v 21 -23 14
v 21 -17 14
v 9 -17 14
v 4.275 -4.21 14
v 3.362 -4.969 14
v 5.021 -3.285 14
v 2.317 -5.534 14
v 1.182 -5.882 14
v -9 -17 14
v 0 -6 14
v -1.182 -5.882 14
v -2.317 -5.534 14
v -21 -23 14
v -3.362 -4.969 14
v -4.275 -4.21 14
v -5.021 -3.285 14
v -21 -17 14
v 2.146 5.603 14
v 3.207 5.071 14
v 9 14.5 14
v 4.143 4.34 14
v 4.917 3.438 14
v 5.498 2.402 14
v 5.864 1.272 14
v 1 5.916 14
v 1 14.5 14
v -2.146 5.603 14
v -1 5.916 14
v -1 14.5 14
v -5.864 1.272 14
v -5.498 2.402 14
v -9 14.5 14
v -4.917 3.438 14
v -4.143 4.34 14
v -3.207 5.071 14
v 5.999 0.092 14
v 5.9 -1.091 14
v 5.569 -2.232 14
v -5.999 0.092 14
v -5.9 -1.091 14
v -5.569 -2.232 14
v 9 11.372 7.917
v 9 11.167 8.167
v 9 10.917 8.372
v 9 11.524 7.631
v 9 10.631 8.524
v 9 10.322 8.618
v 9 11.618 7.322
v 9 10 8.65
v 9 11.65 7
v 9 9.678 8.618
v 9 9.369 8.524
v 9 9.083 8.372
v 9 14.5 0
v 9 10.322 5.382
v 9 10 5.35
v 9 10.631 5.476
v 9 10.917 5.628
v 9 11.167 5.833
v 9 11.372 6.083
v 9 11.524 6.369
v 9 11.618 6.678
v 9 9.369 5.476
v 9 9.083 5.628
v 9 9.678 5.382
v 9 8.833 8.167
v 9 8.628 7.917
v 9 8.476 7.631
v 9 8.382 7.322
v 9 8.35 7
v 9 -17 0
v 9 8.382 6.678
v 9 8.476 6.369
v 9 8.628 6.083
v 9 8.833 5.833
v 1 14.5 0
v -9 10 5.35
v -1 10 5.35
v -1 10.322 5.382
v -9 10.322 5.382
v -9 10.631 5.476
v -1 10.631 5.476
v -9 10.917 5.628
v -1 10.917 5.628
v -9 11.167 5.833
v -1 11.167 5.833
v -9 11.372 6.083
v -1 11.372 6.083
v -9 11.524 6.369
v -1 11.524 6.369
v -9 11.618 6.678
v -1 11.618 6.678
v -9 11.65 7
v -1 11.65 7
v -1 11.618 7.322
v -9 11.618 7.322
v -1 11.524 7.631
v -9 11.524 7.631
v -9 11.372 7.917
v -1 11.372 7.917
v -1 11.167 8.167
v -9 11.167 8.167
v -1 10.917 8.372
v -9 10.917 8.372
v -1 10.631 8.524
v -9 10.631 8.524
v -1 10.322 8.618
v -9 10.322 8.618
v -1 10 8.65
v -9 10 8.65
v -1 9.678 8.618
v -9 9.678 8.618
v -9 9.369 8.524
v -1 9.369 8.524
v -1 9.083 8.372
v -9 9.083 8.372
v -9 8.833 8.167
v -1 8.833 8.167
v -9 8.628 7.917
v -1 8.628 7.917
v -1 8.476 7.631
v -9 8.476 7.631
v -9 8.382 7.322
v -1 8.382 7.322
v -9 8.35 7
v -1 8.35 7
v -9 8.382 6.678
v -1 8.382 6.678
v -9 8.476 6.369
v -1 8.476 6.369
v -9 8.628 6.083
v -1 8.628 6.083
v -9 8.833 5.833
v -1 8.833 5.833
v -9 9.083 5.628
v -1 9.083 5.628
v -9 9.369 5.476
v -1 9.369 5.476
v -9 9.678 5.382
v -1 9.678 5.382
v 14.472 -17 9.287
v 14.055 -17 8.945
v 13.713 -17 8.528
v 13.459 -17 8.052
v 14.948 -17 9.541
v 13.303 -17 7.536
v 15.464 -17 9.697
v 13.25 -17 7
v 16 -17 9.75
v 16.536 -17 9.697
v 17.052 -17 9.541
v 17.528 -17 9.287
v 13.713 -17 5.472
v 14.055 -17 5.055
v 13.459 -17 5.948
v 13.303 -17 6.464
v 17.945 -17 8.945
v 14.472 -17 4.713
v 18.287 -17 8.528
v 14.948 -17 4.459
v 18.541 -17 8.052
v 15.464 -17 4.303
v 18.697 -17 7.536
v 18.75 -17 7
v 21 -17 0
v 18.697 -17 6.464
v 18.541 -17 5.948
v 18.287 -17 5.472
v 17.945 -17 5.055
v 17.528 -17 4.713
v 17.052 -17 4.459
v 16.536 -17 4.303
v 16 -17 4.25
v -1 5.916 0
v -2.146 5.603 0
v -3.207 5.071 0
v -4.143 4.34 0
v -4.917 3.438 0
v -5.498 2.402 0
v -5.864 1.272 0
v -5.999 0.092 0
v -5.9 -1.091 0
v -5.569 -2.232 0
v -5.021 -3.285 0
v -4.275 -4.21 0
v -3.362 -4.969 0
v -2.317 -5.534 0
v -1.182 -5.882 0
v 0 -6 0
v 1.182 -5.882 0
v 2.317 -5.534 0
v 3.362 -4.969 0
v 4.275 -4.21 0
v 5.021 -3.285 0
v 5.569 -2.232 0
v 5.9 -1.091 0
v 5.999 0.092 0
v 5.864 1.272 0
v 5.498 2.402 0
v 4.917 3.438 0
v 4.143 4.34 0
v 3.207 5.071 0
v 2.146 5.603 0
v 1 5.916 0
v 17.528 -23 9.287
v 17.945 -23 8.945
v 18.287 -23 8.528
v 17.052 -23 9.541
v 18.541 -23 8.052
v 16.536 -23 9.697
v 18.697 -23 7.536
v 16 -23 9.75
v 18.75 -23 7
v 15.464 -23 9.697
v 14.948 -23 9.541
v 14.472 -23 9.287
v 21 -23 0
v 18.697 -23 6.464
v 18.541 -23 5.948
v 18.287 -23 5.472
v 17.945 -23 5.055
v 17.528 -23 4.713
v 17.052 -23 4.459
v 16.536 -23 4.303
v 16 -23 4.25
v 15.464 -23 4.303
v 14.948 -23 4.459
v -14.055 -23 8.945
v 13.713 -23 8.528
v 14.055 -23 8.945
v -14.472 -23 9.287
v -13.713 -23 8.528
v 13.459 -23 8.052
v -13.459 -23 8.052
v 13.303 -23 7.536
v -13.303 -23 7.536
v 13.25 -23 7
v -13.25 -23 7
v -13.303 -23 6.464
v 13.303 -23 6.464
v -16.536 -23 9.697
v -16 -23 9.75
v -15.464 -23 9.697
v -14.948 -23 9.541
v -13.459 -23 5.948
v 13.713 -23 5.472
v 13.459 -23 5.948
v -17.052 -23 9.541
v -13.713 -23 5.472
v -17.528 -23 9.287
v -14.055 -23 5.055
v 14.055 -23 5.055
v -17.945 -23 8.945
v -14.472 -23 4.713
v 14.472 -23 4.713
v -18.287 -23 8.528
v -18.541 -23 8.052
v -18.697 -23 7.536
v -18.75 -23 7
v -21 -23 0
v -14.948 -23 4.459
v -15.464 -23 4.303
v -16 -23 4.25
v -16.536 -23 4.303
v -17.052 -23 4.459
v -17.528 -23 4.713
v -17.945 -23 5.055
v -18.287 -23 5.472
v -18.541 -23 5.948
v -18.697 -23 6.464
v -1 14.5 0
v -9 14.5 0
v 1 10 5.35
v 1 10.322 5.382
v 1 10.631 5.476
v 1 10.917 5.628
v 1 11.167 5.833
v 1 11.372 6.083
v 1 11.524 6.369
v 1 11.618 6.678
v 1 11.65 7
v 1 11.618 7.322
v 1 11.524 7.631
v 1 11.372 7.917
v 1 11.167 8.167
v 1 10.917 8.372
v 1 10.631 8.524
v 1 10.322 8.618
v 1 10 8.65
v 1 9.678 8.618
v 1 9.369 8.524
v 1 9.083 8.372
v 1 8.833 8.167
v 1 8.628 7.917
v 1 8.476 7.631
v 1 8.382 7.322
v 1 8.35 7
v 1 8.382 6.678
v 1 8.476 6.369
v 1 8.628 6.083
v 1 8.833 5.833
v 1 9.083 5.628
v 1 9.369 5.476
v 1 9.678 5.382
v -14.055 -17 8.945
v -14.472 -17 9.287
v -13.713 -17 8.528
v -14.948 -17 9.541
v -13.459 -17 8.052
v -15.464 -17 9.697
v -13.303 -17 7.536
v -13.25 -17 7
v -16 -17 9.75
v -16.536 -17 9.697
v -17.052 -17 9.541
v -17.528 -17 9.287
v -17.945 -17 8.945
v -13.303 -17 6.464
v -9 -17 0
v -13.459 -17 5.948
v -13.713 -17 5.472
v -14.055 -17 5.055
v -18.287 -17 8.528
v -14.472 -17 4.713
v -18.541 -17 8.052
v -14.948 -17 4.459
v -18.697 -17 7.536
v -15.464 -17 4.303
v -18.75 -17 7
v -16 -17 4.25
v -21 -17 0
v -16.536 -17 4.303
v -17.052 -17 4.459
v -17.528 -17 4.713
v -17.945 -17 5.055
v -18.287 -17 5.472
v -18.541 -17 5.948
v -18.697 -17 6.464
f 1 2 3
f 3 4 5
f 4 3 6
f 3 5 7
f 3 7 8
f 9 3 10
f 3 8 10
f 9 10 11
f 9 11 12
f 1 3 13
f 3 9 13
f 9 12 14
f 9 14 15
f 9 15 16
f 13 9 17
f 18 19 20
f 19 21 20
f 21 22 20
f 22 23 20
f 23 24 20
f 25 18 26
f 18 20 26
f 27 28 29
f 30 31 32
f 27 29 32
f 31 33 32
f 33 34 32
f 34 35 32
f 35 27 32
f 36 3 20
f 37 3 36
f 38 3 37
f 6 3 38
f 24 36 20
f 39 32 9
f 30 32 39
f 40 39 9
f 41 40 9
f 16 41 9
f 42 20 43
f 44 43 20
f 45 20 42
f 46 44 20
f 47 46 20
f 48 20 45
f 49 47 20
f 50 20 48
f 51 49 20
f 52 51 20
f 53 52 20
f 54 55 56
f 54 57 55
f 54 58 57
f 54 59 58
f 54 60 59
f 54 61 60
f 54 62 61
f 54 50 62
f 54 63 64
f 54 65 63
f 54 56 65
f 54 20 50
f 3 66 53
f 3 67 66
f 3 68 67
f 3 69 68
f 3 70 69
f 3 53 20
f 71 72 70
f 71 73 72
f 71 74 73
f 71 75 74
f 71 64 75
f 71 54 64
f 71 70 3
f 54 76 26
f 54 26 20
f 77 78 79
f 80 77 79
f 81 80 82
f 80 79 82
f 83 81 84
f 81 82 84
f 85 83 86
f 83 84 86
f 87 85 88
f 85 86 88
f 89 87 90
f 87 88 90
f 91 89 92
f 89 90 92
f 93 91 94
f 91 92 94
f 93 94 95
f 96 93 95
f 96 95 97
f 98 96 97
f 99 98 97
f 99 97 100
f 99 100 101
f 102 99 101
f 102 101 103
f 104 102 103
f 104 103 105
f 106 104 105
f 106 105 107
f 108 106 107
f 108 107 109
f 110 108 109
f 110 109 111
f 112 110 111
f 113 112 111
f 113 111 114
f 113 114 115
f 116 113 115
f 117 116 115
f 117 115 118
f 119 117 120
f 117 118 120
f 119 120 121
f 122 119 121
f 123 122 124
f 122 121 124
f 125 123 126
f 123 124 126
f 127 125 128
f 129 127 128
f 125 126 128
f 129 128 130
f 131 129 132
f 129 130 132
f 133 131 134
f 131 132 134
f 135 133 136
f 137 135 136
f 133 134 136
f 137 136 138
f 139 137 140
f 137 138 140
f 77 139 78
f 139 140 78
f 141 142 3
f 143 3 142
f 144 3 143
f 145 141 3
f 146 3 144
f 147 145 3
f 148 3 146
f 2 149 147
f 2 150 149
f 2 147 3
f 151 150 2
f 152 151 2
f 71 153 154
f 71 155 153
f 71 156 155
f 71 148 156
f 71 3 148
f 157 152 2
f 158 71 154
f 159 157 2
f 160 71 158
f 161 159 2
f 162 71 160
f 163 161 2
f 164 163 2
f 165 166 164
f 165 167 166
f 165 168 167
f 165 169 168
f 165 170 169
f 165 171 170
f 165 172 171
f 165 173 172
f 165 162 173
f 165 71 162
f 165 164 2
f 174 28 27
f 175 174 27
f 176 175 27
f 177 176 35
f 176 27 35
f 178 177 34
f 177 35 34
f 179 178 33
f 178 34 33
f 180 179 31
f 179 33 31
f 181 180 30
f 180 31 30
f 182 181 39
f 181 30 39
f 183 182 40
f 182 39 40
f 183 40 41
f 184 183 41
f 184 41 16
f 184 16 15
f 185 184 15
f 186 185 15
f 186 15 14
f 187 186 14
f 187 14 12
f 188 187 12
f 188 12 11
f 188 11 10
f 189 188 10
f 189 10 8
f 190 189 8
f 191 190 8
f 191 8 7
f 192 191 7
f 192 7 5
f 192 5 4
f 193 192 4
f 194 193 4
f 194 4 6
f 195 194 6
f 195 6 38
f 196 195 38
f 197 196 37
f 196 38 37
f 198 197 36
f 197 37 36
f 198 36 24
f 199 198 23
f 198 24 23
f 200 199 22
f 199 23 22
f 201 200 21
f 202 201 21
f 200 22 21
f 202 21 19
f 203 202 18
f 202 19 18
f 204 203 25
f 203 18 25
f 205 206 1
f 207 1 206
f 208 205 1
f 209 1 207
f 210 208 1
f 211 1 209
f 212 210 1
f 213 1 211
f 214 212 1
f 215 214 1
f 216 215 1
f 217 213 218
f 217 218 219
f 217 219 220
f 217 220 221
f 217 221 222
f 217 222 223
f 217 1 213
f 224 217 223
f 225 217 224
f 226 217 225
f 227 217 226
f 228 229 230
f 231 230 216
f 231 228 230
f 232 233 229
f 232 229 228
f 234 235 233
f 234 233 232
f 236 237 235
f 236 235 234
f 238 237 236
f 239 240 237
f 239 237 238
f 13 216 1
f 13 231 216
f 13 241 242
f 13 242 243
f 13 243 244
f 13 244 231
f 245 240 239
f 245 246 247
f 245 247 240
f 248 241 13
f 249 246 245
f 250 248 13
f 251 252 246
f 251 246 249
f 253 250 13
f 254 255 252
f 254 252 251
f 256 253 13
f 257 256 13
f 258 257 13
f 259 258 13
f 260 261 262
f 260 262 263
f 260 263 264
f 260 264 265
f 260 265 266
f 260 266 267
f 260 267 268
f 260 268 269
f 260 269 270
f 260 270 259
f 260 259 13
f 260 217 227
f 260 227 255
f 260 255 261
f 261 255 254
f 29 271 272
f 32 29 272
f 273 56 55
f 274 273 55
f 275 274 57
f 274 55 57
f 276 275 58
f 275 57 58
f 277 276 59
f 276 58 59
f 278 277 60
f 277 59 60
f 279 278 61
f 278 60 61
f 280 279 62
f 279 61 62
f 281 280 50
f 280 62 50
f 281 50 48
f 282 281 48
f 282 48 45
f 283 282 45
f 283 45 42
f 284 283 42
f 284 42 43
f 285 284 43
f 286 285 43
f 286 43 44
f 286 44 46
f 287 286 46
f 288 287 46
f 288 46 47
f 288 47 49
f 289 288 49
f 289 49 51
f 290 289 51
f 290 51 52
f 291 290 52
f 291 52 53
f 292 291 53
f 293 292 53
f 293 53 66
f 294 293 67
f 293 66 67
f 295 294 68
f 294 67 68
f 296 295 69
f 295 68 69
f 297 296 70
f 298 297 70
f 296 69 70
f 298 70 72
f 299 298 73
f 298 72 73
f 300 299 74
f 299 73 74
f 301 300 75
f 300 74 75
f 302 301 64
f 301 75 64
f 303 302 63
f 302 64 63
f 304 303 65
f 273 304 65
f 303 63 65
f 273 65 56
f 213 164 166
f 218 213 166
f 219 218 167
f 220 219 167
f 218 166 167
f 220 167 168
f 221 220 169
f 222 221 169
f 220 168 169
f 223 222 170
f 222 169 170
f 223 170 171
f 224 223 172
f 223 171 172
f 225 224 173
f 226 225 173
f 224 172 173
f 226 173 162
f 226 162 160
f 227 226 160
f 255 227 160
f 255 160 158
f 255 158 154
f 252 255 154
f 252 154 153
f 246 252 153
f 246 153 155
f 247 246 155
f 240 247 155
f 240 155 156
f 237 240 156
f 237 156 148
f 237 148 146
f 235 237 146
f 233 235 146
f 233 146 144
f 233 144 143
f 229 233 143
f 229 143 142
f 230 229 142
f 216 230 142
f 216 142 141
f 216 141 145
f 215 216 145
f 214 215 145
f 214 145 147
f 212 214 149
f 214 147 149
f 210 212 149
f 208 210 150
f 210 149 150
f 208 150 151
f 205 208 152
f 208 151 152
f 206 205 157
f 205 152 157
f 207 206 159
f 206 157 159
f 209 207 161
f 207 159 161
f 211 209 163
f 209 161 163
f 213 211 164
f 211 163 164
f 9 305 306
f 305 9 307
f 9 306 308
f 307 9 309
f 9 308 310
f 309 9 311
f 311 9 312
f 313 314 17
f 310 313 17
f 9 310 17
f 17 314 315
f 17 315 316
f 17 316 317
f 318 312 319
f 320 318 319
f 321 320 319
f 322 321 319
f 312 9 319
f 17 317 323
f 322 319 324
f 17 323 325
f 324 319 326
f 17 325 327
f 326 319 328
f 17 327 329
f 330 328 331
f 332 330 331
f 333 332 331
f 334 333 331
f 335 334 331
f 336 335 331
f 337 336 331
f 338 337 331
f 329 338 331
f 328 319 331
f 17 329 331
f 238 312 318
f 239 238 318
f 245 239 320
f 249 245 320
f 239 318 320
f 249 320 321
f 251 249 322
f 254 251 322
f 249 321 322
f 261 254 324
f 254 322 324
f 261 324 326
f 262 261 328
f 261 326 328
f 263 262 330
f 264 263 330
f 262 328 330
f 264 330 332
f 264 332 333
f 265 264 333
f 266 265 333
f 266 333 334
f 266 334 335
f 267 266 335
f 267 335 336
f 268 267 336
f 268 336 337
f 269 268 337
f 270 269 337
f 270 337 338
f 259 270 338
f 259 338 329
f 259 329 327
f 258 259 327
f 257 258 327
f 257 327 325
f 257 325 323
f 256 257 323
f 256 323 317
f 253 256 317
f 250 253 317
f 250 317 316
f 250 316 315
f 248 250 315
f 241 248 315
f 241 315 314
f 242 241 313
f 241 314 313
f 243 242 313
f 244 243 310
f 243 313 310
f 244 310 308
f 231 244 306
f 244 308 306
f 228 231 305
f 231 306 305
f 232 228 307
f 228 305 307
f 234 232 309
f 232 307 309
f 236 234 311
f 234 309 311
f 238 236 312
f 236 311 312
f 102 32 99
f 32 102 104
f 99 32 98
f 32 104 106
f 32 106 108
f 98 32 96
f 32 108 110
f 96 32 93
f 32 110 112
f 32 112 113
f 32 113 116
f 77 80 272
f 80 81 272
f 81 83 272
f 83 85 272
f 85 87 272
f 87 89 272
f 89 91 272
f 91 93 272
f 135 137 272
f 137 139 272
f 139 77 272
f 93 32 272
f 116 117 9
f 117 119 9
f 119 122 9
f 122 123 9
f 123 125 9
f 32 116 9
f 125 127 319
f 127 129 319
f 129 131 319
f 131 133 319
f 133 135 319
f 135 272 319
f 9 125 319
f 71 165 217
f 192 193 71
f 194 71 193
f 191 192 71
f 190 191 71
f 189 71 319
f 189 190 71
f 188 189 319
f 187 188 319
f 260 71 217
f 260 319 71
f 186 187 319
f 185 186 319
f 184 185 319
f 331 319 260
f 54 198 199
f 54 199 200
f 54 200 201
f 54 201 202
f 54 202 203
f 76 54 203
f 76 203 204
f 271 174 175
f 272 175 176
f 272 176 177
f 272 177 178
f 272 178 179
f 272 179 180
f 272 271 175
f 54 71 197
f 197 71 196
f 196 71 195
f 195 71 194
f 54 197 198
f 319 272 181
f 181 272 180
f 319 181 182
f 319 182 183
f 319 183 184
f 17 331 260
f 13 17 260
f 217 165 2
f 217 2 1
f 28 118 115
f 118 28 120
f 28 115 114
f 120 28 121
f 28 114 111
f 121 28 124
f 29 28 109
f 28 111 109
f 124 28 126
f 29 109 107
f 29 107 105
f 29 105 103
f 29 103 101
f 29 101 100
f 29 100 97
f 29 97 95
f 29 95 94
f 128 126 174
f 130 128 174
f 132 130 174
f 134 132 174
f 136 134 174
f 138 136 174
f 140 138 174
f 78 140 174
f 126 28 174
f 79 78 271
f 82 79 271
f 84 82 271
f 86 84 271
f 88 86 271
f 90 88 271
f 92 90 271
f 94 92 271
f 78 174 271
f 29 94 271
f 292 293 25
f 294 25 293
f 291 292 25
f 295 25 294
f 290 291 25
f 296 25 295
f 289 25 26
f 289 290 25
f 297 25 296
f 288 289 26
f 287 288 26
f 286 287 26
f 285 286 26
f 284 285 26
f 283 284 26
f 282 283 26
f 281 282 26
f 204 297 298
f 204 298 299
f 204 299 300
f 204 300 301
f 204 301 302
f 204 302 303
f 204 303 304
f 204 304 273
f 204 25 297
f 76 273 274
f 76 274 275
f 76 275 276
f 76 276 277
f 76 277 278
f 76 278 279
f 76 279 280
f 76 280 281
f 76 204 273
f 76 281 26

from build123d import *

# Parameters (mm, degrees)
BOSS_EXTRUDE1_DEPTH         = 14
TAP_DRILL_FOR_M4X0_7_TAP2_D = 3.3
F_12_0_12_DIAMETER_HOLE1_D  = 12
TAP_DRILL_FOR_M5X0_8_TAP1_D = 5.5


with BuildPart() as part:
    # Sketch2 → Boss-Extrude1 (new body)
    with BuildSketch(Plane.XY):
        Polygon((-1, 0), (-1, 14.5), (-9, 14.5), (-9, -17), (-21, -17), (-21, -23), (0, -23), (0, 0), align=None)
    boss_extrude1 = extrude(amount=BOSS_EXTRUDE1_DEPTH)

    # Mirror1: Boss-Extrude1 across plane
    add(boss_extrude1.mirror(Plane(origin=(0, -23, 14), x_dir=(0, 0, 1), z_dir=(-1, 0, 0))))

    # Tap Drill for M4x0.7 Tap2 (through all)
    with Locations(Plane.ZY.offset(9)):
        with Locations((7, 10)):
            Hole(TAP_DRILL_FOR_M4X0_7_TAP2_D / 2)

    # Ø12.0 (12) Diameter Hole1 (through all)
    with Locations(Plane(origin=(0, 0, 0), x_dir=(1, 0, 0), z_dir=(0, 0, -1))):
        with Locations((0, 0)):
            Hole(F_12_0_12_DIAMETER_HOLE1_D / 2)

    # Tap Drill for M5x0.8 Tap1 (through all)
    with Locations(Plane(origin=(0, -23, 0), x_dir=(-1, 0, 0), z_dir=(0, -1, 0))):
        with Locations((-16, -7), (16, -7)):
            Hole(TAP_DRILL_FOR_M5X0_8_TAP1_D / 2)


solid = part.part
